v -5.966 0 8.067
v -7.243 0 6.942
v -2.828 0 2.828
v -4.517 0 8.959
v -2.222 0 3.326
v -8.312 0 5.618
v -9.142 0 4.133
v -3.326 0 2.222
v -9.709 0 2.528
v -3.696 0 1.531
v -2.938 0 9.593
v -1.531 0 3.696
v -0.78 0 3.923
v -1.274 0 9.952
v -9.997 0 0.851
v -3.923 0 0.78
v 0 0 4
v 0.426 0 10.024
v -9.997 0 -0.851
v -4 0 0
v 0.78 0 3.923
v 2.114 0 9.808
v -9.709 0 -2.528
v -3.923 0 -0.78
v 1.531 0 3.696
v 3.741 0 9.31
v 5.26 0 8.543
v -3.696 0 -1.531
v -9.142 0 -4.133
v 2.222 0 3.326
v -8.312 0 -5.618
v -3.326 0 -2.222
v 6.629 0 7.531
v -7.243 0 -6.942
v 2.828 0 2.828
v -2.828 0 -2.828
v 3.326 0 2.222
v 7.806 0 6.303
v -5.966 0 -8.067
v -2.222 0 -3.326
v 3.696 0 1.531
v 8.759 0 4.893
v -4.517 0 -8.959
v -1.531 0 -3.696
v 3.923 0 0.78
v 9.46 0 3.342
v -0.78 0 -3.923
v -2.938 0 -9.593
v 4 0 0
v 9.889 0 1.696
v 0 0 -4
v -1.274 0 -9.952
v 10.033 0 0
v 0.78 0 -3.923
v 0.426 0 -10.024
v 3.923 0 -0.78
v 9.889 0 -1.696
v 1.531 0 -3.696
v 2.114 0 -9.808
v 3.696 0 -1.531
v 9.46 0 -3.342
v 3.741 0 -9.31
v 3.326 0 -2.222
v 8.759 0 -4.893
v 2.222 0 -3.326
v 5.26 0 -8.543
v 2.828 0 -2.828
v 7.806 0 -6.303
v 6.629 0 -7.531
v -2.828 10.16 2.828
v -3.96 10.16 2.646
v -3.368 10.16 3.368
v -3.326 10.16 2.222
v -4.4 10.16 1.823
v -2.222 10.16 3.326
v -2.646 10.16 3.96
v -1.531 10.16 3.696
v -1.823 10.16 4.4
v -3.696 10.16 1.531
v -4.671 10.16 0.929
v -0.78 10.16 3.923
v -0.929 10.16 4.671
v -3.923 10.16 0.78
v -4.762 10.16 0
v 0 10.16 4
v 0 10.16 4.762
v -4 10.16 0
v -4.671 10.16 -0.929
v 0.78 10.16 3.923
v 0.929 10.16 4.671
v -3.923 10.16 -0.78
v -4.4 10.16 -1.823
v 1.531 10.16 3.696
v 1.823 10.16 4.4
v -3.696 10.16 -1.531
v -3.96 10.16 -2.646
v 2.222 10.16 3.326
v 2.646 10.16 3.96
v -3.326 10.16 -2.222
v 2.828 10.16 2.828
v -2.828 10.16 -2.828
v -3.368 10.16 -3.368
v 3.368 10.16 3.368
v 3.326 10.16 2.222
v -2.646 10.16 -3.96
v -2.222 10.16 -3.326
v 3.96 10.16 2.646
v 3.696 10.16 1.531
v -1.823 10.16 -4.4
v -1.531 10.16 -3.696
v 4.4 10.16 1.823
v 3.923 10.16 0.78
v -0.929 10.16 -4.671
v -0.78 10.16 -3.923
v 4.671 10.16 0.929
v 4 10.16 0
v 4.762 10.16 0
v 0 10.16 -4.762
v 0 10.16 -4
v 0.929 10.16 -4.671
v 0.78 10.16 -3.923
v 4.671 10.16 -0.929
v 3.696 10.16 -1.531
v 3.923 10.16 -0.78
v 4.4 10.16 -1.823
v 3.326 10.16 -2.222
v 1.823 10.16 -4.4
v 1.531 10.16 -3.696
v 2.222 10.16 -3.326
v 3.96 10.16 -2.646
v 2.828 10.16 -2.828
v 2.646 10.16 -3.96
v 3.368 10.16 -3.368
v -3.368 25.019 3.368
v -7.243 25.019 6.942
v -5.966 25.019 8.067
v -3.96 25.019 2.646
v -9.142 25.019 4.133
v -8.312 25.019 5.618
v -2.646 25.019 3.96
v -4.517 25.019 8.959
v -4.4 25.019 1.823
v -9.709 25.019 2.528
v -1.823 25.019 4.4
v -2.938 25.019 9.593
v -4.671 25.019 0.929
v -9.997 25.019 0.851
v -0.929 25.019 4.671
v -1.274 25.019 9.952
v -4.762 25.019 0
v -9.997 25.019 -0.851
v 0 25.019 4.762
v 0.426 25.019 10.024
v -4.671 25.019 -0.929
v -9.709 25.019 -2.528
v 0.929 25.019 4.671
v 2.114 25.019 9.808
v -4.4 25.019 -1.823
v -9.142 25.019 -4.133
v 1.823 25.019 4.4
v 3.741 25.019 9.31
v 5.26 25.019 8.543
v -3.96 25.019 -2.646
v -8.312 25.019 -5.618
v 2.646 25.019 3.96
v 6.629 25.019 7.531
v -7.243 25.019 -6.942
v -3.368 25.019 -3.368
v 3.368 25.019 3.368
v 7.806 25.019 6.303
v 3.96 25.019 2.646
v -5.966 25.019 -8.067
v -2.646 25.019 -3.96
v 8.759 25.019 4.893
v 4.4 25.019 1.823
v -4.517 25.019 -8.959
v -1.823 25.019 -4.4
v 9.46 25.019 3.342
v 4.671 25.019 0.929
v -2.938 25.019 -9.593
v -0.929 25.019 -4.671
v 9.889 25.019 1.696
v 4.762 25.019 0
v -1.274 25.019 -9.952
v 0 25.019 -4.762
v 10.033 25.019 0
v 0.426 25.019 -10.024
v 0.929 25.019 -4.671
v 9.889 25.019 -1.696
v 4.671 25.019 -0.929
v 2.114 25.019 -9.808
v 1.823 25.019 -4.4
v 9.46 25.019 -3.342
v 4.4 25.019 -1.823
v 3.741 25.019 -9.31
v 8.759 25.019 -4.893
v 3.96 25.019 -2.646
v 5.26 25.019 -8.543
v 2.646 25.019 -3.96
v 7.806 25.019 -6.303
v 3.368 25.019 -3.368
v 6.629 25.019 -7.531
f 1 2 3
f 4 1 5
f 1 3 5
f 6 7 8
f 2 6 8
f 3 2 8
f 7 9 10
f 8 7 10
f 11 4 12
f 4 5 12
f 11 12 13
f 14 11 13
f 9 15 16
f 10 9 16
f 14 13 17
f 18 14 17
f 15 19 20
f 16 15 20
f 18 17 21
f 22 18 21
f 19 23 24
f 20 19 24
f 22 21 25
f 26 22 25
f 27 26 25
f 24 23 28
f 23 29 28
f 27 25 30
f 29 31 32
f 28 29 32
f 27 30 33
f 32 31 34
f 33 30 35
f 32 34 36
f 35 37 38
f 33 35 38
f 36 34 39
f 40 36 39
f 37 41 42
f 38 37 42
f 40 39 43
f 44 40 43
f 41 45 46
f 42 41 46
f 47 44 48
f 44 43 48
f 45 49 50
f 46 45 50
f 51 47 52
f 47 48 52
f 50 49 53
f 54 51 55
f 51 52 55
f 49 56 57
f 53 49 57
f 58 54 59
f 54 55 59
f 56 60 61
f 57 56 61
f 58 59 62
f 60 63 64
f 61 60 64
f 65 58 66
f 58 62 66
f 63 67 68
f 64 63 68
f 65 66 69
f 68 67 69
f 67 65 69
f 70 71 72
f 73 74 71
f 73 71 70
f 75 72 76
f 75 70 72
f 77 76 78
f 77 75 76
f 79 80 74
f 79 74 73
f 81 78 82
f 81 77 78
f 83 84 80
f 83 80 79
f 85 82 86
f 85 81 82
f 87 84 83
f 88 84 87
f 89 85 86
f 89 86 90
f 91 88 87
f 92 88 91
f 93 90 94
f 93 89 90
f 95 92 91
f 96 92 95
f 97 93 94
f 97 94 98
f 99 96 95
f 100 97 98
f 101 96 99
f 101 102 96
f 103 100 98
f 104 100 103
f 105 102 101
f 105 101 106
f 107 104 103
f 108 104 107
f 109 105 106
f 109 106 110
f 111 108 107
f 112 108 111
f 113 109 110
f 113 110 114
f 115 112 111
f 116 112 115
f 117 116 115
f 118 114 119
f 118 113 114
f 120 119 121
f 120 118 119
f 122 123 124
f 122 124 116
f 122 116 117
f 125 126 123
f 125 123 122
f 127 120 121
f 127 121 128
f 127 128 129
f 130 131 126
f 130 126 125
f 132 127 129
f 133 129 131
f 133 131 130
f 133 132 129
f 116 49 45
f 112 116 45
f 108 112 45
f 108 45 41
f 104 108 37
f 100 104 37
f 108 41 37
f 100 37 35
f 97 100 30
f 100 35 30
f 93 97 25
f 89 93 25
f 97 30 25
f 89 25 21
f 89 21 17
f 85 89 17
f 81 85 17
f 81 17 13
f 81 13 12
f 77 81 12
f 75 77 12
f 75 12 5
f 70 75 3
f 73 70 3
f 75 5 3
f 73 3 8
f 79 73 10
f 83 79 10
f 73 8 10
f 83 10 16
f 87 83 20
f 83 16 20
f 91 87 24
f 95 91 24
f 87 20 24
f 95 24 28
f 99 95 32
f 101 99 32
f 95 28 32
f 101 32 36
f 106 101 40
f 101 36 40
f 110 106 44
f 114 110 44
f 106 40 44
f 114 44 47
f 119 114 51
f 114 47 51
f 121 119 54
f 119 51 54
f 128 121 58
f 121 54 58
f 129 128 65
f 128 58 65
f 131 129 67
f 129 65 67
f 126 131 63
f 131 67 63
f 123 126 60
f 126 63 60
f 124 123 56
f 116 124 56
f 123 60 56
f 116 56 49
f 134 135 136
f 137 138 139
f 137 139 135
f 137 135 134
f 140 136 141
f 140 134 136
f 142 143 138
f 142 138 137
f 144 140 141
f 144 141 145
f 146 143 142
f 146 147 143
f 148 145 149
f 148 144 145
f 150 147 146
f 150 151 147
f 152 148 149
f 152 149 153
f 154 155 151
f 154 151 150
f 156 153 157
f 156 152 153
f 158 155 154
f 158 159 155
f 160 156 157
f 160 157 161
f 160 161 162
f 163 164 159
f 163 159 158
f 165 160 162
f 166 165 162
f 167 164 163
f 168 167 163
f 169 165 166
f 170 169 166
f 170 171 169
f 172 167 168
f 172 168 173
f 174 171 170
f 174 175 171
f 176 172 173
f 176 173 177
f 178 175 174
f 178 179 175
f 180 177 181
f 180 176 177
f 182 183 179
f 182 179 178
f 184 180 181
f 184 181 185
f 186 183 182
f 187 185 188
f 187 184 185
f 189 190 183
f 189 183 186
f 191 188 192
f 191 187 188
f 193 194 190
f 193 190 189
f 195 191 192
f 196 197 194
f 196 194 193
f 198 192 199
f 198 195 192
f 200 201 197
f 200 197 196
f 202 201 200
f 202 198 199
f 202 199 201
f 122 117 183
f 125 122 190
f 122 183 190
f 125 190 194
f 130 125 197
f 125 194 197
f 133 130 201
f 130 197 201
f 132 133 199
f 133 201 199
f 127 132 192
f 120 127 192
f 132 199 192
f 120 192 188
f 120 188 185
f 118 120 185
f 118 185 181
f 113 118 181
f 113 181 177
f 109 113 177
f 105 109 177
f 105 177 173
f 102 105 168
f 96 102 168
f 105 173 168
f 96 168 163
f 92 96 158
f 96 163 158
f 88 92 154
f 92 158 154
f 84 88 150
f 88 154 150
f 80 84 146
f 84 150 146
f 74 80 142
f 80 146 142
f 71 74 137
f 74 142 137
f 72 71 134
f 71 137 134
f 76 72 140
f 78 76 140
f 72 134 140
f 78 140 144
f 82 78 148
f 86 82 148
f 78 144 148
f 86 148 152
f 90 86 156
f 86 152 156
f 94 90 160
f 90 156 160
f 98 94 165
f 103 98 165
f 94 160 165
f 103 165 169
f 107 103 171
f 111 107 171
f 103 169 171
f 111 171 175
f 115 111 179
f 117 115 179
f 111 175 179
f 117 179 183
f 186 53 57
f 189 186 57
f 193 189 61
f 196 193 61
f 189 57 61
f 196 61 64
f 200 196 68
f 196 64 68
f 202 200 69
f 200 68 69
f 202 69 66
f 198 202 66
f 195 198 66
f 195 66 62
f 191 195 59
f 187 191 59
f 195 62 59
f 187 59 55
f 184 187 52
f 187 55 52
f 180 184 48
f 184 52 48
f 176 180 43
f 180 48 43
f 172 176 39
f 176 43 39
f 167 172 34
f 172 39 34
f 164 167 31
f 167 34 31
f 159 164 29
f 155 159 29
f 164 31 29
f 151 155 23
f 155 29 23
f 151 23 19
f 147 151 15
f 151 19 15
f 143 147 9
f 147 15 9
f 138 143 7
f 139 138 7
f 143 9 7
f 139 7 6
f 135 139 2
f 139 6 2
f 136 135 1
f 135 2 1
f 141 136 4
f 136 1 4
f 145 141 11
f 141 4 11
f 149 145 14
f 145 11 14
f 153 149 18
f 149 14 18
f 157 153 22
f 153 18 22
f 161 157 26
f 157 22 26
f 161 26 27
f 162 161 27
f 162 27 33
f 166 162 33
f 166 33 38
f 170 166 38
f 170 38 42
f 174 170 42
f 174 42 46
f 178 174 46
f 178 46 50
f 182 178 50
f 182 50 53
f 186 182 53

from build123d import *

# Parameters (mm, degrees)
SKETCH1_R           = 10.033
BOSS_EXTRUDE1_DEPTH = 25.019
SKETCH2_R           = 4
CUT_EXTRUDE1_DEPTH  = 10.16
SKETCH3_R           = 4.7625
CUT_EXTRUDE2_DEPTH  = 14.859


with BuildPart() as part:
    # Sketch1 → Boss-Extrude1 (new body)
    with BuildSketch(Plane(origin=(0, 0, 0), x_dir=(1, 0, 0), z_dir=(0, 1, 0))):
        Circle(SKETCH1_R)
    extrude(amount=BOSS_EXTRUDE1_DEPTH)

    # Sketch2 → Cut-Extrude1 (cut)
    with BuildSketch(Plane.XZ):
        Circle(SKETCH2_R)
    extrude(amount=-CUT_EXTRUDE1_DEPTH, mode=Mode.SUBTRACT)

    # Sketch3 → Cut-Extrude2 (cut)
    with BuildSketch(Plane(origin=(0, 25.019, 0), x_dir=(1, 0, 0), z_dir=(0, 1, 0))):
        Circle(SKETCH3_R)
    extrude(amount=-CUT_EXTRUDE2_DEPTH, mode=Mode.SUBTRACT)


solid = part.part
